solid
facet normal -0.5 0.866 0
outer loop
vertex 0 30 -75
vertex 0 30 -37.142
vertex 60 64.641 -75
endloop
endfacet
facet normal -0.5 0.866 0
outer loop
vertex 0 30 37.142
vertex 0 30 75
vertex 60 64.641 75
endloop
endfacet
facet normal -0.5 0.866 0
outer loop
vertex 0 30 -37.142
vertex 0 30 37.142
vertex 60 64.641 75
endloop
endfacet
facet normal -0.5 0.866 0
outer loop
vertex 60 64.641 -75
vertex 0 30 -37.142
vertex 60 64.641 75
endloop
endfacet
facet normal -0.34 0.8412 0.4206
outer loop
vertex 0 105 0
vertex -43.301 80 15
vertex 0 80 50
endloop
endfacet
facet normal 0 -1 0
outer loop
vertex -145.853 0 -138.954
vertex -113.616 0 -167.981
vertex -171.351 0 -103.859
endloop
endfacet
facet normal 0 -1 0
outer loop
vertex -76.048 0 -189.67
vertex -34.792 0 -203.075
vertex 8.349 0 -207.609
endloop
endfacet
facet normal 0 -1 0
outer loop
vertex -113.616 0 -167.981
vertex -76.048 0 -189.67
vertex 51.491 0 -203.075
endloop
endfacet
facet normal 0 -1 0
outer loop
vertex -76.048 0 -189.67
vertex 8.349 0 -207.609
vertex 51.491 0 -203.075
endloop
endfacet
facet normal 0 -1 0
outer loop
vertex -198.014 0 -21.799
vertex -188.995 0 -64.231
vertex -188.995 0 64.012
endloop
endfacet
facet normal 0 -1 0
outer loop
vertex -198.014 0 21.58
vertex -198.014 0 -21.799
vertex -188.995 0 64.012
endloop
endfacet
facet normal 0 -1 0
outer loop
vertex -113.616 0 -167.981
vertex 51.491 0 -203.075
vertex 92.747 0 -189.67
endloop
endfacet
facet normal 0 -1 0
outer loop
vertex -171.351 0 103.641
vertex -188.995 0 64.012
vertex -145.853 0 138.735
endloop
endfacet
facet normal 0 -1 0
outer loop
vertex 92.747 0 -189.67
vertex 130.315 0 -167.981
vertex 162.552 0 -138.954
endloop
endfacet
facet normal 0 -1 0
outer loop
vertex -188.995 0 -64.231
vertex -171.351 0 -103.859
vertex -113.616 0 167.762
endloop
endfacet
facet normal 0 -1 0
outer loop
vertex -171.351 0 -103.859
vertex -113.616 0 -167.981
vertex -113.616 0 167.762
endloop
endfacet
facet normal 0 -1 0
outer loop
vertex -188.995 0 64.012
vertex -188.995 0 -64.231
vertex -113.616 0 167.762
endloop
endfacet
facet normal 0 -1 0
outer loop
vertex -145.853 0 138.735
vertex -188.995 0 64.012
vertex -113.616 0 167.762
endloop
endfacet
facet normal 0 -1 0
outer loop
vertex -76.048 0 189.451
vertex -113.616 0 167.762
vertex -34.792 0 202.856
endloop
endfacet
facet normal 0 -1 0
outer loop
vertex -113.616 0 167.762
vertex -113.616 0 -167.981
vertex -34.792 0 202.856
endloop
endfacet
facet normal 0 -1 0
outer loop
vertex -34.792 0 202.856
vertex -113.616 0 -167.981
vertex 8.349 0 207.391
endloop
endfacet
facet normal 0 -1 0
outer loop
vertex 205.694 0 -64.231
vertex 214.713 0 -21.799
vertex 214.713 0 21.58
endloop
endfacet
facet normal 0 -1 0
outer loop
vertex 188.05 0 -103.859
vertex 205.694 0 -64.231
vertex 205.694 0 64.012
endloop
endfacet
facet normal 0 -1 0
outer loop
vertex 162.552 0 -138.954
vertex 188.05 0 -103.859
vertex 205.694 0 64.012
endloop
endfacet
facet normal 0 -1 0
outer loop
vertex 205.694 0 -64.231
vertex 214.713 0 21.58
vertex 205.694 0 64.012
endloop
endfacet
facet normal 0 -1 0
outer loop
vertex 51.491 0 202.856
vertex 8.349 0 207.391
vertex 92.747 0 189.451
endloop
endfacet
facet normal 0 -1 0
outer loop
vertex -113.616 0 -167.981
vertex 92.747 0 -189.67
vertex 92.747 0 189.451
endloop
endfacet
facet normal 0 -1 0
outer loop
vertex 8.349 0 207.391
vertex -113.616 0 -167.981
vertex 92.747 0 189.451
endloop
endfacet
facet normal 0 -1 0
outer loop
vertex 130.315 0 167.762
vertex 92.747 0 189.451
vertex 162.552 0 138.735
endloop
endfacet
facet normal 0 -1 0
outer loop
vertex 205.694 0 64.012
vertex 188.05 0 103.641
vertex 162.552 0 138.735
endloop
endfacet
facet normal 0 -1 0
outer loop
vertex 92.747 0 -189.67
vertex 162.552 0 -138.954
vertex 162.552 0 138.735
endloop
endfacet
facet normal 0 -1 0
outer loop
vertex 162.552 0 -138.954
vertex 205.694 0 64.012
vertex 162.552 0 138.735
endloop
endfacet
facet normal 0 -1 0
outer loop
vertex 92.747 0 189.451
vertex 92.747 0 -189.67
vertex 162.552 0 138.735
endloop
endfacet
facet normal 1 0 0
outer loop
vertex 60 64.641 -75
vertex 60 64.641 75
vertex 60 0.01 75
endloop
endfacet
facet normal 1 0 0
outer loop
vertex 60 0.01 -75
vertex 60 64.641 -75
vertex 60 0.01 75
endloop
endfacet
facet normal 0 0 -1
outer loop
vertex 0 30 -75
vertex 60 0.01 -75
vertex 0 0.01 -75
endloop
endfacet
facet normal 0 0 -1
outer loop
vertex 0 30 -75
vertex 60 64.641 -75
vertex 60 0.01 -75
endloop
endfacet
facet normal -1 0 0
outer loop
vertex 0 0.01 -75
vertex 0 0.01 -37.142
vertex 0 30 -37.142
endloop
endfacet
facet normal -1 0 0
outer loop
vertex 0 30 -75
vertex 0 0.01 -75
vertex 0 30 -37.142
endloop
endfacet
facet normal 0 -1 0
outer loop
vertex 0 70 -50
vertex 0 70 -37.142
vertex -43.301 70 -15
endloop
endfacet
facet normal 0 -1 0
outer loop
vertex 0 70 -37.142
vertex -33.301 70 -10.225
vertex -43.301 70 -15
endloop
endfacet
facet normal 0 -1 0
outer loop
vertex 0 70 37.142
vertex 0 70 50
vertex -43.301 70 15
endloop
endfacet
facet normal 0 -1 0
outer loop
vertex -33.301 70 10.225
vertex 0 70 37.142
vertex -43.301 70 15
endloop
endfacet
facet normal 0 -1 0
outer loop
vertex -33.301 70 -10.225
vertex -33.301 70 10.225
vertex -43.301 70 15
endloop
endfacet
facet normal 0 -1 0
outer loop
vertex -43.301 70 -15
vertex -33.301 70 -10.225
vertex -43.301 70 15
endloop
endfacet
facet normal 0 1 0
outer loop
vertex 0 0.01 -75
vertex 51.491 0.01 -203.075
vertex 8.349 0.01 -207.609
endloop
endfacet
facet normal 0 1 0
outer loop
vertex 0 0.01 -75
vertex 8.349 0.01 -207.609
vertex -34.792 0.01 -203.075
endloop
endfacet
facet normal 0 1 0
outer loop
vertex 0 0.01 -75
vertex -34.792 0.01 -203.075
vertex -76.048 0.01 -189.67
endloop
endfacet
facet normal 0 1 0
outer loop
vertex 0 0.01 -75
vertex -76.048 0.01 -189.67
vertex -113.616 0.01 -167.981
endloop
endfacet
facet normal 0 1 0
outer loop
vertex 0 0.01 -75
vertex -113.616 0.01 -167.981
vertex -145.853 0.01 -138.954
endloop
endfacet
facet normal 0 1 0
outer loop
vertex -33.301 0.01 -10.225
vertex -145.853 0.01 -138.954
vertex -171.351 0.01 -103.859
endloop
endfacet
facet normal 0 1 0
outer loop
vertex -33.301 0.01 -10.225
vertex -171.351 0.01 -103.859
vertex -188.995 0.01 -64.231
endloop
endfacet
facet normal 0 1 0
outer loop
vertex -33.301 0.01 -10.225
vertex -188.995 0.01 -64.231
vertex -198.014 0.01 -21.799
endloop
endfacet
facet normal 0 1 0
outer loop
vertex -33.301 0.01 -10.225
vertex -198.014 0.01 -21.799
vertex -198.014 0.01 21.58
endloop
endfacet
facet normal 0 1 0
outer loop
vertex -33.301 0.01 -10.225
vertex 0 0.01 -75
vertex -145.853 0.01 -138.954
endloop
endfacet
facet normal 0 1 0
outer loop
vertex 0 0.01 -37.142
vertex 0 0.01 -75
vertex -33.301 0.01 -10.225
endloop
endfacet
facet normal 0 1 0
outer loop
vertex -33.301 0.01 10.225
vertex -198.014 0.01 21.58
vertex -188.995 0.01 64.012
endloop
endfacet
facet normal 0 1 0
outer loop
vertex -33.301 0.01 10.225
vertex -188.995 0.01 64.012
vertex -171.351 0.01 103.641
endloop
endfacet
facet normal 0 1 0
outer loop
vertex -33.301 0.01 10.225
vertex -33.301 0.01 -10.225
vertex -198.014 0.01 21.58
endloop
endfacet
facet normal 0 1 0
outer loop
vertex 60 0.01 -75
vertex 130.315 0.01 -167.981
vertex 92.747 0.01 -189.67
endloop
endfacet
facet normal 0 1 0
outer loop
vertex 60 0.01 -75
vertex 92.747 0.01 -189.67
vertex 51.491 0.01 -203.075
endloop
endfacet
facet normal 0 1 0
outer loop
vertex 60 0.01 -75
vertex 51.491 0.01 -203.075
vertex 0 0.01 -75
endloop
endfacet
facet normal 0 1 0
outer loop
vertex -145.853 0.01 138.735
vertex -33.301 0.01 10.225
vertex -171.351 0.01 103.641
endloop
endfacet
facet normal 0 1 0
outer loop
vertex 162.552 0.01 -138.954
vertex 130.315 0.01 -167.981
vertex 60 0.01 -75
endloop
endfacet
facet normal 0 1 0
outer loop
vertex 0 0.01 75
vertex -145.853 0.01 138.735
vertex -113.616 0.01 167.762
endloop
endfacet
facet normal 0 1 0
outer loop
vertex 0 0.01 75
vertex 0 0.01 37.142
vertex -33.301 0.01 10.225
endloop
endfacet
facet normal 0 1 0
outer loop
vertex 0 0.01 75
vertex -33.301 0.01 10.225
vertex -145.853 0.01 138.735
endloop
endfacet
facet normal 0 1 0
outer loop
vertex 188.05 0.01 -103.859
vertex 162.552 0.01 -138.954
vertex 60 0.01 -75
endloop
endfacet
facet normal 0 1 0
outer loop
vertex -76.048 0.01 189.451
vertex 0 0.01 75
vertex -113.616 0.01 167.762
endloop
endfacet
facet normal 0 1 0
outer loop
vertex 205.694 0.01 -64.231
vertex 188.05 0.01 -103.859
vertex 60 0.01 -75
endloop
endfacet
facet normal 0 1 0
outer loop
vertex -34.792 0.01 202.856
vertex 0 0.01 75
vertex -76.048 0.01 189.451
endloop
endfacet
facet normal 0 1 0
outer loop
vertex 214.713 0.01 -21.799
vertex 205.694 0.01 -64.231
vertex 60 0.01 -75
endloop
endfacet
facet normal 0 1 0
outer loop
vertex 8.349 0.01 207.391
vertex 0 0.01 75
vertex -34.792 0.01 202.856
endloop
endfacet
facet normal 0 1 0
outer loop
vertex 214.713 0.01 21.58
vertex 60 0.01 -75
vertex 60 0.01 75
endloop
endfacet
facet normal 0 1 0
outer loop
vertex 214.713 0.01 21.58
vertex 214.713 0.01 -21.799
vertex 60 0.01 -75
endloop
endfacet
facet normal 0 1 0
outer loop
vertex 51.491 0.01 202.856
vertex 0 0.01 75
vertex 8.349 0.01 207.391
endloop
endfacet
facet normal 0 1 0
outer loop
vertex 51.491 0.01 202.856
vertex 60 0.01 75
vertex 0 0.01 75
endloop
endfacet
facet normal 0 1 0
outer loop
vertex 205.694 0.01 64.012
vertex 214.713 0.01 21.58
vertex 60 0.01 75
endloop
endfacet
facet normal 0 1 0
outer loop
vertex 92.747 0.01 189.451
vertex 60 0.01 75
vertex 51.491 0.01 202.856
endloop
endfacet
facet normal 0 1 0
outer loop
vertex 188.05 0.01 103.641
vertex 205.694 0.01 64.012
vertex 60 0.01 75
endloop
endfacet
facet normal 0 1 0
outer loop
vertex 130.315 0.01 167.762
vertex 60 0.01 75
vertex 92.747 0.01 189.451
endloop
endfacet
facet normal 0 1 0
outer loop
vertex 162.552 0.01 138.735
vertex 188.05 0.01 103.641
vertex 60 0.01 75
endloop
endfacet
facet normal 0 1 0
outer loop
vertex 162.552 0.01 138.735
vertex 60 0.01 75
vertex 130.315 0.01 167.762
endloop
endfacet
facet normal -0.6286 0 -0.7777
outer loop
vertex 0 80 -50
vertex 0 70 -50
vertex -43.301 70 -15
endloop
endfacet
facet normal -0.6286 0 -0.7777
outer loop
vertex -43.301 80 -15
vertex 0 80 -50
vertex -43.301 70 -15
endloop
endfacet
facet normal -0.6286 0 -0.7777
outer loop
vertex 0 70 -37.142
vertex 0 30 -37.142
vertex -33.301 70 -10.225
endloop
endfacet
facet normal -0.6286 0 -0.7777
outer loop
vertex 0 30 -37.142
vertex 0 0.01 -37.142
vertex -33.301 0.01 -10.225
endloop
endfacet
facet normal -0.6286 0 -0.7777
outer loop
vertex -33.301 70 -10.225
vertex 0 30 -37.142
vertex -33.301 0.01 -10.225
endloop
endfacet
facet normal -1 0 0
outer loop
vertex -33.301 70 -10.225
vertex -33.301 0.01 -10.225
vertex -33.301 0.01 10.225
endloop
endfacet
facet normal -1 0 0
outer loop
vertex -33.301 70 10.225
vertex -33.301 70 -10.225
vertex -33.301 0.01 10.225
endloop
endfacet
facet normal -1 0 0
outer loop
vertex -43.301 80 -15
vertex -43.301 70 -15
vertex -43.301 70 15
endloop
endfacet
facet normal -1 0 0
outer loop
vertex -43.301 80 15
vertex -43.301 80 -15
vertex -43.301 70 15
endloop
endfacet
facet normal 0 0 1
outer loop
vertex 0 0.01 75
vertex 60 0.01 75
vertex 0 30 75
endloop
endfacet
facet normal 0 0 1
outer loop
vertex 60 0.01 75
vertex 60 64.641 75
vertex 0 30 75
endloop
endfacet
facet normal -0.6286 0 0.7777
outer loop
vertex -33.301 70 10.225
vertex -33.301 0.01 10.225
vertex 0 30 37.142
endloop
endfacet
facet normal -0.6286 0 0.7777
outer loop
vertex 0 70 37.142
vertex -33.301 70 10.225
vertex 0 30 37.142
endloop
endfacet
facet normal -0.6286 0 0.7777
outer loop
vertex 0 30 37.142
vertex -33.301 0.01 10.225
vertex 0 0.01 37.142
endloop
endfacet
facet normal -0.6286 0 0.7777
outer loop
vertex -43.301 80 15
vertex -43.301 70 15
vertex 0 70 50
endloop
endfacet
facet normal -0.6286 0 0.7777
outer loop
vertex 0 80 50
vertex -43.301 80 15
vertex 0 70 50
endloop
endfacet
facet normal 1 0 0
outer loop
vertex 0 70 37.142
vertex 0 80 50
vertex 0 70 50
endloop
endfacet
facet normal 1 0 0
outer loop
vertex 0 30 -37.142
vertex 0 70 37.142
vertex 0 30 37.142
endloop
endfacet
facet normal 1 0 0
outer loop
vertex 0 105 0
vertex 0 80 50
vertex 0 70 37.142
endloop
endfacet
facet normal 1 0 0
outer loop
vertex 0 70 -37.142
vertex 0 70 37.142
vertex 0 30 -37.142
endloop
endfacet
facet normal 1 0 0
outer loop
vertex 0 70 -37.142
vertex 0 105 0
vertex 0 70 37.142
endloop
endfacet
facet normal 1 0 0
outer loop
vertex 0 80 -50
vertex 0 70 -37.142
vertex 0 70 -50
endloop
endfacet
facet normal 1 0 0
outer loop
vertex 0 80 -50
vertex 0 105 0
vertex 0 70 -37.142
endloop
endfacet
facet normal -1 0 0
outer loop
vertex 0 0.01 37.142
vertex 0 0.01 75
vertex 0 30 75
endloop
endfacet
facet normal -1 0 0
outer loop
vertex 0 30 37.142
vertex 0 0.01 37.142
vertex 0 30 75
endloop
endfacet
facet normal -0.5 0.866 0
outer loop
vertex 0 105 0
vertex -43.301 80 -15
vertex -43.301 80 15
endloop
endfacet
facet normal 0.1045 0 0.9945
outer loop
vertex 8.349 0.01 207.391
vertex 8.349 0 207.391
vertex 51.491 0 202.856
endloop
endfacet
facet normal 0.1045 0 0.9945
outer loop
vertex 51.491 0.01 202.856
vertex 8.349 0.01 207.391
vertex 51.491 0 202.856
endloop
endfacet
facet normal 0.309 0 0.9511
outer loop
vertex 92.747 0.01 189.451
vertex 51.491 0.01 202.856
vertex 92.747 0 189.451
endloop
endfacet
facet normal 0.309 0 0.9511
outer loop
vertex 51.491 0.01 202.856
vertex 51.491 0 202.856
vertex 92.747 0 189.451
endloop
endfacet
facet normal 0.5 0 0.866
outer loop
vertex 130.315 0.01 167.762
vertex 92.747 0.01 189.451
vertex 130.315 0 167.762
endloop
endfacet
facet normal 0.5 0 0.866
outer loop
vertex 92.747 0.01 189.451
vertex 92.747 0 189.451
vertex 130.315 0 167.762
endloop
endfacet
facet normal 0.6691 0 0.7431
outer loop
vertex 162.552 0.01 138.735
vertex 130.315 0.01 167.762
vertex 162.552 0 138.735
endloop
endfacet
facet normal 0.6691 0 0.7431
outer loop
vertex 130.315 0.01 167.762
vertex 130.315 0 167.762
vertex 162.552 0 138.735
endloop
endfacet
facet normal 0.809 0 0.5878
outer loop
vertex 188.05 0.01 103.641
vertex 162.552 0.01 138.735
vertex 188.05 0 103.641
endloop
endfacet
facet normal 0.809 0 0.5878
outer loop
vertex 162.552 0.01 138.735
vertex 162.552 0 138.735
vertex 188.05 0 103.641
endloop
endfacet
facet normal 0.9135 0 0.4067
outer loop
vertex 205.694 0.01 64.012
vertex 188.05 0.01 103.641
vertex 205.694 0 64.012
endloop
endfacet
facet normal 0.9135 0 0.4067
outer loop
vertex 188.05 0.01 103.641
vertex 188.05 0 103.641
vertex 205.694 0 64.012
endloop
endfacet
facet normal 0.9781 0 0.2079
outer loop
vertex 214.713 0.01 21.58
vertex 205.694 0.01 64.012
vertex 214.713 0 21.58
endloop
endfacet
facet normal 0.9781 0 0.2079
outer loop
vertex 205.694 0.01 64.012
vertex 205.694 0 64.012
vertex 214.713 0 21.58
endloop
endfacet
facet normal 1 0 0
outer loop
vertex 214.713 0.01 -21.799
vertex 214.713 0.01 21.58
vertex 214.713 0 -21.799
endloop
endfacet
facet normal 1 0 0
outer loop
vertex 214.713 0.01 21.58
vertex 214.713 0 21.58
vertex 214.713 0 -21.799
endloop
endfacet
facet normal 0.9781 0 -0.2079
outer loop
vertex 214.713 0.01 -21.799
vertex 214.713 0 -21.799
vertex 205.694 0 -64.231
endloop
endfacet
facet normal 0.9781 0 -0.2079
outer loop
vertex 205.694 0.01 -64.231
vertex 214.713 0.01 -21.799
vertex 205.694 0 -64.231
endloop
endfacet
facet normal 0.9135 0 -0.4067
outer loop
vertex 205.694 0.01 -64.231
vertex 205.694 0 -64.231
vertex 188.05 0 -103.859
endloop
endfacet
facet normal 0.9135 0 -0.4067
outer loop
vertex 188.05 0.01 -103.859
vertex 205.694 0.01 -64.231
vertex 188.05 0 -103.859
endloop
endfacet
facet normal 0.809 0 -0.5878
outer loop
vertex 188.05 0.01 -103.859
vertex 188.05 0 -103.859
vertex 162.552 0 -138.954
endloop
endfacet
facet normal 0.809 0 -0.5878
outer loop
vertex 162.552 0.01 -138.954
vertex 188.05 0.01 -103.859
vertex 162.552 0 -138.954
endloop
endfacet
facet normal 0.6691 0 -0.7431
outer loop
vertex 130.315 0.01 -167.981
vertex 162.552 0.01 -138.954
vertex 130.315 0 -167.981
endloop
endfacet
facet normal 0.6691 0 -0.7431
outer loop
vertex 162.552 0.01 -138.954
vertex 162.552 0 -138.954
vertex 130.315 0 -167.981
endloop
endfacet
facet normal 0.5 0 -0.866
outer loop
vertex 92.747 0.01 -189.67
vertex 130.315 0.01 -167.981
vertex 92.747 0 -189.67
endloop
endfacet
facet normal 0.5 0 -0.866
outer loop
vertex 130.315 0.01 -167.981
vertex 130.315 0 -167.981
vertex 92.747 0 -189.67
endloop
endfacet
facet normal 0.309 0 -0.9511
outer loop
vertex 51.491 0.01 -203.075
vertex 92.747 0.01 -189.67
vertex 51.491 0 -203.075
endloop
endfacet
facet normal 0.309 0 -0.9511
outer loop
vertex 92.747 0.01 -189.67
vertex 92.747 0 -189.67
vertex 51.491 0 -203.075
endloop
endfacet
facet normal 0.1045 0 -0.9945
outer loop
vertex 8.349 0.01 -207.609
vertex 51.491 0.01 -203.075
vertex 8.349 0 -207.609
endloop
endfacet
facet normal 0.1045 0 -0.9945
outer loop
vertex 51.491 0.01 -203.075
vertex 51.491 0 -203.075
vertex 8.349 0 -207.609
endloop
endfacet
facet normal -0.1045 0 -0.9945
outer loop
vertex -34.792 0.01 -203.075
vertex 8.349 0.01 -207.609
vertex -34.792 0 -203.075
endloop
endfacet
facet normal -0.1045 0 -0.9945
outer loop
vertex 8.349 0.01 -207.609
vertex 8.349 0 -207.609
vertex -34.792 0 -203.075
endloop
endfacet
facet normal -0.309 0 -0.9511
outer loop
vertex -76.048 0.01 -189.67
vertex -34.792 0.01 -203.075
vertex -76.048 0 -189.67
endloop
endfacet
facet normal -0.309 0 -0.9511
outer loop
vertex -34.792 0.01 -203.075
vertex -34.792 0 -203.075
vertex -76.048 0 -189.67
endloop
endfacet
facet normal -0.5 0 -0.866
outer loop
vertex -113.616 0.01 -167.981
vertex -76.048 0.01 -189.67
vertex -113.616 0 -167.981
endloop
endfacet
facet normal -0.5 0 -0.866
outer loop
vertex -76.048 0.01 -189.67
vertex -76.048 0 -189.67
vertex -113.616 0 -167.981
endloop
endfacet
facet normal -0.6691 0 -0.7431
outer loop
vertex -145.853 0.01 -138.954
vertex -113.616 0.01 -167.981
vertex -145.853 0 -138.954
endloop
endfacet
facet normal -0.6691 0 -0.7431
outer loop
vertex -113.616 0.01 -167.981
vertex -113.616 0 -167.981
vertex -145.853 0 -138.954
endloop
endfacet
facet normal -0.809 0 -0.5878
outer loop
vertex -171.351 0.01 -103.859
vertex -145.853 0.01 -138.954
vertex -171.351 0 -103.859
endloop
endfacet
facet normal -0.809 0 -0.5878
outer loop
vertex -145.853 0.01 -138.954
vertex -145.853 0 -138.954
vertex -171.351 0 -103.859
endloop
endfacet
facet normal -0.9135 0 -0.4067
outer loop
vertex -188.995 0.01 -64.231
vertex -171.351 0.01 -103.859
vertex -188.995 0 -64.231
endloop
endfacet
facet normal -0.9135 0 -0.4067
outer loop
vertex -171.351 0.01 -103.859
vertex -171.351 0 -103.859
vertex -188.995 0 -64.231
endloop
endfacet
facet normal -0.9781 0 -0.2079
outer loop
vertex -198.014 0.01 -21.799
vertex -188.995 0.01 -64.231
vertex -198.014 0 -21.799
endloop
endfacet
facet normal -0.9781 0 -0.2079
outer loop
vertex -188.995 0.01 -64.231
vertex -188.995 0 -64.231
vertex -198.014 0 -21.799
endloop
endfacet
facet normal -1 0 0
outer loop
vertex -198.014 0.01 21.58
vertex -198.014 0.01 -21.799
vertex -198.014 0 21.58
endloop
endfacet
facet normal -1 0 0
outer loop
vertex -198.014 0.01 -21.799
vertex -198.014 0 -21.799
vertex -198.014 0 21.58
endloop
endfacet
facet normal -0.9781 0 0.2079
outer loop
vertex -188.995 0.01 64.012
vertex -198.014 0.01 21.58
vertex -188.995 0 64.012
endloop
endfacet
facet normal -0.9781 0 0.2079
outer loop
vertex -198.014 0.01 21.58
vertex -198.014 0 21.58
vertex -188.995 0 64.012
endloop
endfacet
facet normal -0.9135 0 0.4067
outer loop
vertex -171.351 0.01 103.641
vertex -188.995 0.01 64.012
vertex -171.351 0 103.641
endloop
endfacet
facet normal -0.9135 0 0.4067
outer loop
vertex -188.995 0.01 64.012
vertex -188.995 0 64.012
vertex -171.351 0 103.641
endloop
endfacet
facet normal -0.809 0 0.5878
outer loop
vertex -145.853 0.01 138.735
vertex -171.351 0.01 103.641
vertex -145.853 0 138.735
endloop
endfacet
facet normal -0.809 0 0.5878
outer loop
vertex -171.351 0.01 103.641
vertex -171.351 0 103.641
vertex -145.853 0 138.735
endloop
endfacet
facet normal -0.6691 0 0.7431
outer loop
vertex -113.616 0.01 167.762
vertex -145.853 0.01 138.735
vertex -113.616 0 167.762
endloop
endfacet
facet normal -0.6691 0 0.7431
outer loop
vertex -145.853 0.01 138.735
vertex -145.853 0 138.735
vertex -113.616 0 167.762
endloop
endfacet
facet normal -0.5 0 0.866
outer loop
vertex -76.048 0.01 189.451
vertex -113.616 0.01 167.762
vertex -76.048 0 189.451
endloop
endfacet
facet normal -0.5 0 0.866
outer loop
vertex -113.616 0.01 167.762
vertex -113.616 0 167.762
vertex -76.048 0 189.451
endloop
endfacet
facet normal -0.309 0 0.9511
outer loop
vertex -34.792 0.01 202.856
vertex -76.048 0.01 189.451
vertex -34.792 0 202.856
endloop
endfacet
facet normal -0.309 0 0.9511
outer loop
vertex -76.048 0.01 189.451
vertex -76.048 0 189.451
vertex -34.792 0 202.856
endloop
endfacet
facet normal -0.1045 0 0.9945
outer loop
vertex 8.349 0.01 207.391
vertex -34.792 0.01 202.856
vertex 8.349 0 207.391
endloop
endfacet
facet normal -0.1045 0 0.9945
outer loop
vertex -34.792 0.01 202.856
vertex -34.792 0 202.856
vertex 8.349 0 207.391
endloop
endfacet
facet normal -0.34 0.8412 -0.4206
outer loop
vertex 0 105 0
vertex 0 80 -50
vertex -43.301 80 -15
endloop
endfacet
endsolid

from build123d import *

# Parameters (mm, degrees)
EXTRUDE1_DEPTH = 75
EXTRUDE2_DEPTH = 70
EXTRUDE3_DEPTH = 10
SKETCH6_R      = 207.5
EXTRUDE4_DEPTH = 0.01


with BuildPart() as part:
    # Sketch1 → Extrude1 (new body, symmetric)
    with BuildSketch(Plane.XY):
        Polygon((0, 0), (0, 30), (60, 64.641016151), (60, 0), align=None)
    extrude(amount=EXTRUDE1_DEPTH, both=True)

    # Sketch2 → Extrude2 (add)
    with BuildSketch(Plane(origin=(0, 0, 0), x_dir=(1, 0, 0), z_dir=(0, 1, 0))):
        Polygon((0, 37.141798985), (-33.301270189, 10.224702754), (-33.301270189, -10.224702754), (0, -37.141798985), align=None)
    extrude(amount=EXTRUDE2_DEPTH)

    # Sketch3 → Extrude3 (add)
    with BuildSketch(Plane(origin=(0, 70, 0), x_dir=(-1, 0, 0), z_dir=(0, 1, 0))):
        Polygon((0, -50), (43.301270189, -15), (43.301270189, 15), (0, 50), align=None)
    extrude(amount=EXTRUDE3_DEPTH)

    # Sketch4 → Loft1 section 0
    with BuildSketch(Plane(origin=(0, 80, 0), x_dir=(-1, 0, 0), z_dir=(0, 1, 0)), mode=Mode.PRIVATE) as loft1_s0:
        Polygon((0, -50), (43.301270189, -15), (43.301270189, 15), (0, 50), align=None)
    loft([loft1_s0.sketch, Vertex(0, 105, 0)])

    # Sketch6 → Extrude4 (add)
    with BuildSketch(Plane(origin=(0, 0, 0), x_dir=(1, 0, 0), z_dir=(0, 1, 0))):
        with Locations(Location((8.349364905, 0.109485549, 0), (0, 0, 270))):  # turned: the seam where the file's is
            Circle(SKETCH6_R)
    extrude(amount=EXTRUDE4_DEPTH)


solid = part.part
